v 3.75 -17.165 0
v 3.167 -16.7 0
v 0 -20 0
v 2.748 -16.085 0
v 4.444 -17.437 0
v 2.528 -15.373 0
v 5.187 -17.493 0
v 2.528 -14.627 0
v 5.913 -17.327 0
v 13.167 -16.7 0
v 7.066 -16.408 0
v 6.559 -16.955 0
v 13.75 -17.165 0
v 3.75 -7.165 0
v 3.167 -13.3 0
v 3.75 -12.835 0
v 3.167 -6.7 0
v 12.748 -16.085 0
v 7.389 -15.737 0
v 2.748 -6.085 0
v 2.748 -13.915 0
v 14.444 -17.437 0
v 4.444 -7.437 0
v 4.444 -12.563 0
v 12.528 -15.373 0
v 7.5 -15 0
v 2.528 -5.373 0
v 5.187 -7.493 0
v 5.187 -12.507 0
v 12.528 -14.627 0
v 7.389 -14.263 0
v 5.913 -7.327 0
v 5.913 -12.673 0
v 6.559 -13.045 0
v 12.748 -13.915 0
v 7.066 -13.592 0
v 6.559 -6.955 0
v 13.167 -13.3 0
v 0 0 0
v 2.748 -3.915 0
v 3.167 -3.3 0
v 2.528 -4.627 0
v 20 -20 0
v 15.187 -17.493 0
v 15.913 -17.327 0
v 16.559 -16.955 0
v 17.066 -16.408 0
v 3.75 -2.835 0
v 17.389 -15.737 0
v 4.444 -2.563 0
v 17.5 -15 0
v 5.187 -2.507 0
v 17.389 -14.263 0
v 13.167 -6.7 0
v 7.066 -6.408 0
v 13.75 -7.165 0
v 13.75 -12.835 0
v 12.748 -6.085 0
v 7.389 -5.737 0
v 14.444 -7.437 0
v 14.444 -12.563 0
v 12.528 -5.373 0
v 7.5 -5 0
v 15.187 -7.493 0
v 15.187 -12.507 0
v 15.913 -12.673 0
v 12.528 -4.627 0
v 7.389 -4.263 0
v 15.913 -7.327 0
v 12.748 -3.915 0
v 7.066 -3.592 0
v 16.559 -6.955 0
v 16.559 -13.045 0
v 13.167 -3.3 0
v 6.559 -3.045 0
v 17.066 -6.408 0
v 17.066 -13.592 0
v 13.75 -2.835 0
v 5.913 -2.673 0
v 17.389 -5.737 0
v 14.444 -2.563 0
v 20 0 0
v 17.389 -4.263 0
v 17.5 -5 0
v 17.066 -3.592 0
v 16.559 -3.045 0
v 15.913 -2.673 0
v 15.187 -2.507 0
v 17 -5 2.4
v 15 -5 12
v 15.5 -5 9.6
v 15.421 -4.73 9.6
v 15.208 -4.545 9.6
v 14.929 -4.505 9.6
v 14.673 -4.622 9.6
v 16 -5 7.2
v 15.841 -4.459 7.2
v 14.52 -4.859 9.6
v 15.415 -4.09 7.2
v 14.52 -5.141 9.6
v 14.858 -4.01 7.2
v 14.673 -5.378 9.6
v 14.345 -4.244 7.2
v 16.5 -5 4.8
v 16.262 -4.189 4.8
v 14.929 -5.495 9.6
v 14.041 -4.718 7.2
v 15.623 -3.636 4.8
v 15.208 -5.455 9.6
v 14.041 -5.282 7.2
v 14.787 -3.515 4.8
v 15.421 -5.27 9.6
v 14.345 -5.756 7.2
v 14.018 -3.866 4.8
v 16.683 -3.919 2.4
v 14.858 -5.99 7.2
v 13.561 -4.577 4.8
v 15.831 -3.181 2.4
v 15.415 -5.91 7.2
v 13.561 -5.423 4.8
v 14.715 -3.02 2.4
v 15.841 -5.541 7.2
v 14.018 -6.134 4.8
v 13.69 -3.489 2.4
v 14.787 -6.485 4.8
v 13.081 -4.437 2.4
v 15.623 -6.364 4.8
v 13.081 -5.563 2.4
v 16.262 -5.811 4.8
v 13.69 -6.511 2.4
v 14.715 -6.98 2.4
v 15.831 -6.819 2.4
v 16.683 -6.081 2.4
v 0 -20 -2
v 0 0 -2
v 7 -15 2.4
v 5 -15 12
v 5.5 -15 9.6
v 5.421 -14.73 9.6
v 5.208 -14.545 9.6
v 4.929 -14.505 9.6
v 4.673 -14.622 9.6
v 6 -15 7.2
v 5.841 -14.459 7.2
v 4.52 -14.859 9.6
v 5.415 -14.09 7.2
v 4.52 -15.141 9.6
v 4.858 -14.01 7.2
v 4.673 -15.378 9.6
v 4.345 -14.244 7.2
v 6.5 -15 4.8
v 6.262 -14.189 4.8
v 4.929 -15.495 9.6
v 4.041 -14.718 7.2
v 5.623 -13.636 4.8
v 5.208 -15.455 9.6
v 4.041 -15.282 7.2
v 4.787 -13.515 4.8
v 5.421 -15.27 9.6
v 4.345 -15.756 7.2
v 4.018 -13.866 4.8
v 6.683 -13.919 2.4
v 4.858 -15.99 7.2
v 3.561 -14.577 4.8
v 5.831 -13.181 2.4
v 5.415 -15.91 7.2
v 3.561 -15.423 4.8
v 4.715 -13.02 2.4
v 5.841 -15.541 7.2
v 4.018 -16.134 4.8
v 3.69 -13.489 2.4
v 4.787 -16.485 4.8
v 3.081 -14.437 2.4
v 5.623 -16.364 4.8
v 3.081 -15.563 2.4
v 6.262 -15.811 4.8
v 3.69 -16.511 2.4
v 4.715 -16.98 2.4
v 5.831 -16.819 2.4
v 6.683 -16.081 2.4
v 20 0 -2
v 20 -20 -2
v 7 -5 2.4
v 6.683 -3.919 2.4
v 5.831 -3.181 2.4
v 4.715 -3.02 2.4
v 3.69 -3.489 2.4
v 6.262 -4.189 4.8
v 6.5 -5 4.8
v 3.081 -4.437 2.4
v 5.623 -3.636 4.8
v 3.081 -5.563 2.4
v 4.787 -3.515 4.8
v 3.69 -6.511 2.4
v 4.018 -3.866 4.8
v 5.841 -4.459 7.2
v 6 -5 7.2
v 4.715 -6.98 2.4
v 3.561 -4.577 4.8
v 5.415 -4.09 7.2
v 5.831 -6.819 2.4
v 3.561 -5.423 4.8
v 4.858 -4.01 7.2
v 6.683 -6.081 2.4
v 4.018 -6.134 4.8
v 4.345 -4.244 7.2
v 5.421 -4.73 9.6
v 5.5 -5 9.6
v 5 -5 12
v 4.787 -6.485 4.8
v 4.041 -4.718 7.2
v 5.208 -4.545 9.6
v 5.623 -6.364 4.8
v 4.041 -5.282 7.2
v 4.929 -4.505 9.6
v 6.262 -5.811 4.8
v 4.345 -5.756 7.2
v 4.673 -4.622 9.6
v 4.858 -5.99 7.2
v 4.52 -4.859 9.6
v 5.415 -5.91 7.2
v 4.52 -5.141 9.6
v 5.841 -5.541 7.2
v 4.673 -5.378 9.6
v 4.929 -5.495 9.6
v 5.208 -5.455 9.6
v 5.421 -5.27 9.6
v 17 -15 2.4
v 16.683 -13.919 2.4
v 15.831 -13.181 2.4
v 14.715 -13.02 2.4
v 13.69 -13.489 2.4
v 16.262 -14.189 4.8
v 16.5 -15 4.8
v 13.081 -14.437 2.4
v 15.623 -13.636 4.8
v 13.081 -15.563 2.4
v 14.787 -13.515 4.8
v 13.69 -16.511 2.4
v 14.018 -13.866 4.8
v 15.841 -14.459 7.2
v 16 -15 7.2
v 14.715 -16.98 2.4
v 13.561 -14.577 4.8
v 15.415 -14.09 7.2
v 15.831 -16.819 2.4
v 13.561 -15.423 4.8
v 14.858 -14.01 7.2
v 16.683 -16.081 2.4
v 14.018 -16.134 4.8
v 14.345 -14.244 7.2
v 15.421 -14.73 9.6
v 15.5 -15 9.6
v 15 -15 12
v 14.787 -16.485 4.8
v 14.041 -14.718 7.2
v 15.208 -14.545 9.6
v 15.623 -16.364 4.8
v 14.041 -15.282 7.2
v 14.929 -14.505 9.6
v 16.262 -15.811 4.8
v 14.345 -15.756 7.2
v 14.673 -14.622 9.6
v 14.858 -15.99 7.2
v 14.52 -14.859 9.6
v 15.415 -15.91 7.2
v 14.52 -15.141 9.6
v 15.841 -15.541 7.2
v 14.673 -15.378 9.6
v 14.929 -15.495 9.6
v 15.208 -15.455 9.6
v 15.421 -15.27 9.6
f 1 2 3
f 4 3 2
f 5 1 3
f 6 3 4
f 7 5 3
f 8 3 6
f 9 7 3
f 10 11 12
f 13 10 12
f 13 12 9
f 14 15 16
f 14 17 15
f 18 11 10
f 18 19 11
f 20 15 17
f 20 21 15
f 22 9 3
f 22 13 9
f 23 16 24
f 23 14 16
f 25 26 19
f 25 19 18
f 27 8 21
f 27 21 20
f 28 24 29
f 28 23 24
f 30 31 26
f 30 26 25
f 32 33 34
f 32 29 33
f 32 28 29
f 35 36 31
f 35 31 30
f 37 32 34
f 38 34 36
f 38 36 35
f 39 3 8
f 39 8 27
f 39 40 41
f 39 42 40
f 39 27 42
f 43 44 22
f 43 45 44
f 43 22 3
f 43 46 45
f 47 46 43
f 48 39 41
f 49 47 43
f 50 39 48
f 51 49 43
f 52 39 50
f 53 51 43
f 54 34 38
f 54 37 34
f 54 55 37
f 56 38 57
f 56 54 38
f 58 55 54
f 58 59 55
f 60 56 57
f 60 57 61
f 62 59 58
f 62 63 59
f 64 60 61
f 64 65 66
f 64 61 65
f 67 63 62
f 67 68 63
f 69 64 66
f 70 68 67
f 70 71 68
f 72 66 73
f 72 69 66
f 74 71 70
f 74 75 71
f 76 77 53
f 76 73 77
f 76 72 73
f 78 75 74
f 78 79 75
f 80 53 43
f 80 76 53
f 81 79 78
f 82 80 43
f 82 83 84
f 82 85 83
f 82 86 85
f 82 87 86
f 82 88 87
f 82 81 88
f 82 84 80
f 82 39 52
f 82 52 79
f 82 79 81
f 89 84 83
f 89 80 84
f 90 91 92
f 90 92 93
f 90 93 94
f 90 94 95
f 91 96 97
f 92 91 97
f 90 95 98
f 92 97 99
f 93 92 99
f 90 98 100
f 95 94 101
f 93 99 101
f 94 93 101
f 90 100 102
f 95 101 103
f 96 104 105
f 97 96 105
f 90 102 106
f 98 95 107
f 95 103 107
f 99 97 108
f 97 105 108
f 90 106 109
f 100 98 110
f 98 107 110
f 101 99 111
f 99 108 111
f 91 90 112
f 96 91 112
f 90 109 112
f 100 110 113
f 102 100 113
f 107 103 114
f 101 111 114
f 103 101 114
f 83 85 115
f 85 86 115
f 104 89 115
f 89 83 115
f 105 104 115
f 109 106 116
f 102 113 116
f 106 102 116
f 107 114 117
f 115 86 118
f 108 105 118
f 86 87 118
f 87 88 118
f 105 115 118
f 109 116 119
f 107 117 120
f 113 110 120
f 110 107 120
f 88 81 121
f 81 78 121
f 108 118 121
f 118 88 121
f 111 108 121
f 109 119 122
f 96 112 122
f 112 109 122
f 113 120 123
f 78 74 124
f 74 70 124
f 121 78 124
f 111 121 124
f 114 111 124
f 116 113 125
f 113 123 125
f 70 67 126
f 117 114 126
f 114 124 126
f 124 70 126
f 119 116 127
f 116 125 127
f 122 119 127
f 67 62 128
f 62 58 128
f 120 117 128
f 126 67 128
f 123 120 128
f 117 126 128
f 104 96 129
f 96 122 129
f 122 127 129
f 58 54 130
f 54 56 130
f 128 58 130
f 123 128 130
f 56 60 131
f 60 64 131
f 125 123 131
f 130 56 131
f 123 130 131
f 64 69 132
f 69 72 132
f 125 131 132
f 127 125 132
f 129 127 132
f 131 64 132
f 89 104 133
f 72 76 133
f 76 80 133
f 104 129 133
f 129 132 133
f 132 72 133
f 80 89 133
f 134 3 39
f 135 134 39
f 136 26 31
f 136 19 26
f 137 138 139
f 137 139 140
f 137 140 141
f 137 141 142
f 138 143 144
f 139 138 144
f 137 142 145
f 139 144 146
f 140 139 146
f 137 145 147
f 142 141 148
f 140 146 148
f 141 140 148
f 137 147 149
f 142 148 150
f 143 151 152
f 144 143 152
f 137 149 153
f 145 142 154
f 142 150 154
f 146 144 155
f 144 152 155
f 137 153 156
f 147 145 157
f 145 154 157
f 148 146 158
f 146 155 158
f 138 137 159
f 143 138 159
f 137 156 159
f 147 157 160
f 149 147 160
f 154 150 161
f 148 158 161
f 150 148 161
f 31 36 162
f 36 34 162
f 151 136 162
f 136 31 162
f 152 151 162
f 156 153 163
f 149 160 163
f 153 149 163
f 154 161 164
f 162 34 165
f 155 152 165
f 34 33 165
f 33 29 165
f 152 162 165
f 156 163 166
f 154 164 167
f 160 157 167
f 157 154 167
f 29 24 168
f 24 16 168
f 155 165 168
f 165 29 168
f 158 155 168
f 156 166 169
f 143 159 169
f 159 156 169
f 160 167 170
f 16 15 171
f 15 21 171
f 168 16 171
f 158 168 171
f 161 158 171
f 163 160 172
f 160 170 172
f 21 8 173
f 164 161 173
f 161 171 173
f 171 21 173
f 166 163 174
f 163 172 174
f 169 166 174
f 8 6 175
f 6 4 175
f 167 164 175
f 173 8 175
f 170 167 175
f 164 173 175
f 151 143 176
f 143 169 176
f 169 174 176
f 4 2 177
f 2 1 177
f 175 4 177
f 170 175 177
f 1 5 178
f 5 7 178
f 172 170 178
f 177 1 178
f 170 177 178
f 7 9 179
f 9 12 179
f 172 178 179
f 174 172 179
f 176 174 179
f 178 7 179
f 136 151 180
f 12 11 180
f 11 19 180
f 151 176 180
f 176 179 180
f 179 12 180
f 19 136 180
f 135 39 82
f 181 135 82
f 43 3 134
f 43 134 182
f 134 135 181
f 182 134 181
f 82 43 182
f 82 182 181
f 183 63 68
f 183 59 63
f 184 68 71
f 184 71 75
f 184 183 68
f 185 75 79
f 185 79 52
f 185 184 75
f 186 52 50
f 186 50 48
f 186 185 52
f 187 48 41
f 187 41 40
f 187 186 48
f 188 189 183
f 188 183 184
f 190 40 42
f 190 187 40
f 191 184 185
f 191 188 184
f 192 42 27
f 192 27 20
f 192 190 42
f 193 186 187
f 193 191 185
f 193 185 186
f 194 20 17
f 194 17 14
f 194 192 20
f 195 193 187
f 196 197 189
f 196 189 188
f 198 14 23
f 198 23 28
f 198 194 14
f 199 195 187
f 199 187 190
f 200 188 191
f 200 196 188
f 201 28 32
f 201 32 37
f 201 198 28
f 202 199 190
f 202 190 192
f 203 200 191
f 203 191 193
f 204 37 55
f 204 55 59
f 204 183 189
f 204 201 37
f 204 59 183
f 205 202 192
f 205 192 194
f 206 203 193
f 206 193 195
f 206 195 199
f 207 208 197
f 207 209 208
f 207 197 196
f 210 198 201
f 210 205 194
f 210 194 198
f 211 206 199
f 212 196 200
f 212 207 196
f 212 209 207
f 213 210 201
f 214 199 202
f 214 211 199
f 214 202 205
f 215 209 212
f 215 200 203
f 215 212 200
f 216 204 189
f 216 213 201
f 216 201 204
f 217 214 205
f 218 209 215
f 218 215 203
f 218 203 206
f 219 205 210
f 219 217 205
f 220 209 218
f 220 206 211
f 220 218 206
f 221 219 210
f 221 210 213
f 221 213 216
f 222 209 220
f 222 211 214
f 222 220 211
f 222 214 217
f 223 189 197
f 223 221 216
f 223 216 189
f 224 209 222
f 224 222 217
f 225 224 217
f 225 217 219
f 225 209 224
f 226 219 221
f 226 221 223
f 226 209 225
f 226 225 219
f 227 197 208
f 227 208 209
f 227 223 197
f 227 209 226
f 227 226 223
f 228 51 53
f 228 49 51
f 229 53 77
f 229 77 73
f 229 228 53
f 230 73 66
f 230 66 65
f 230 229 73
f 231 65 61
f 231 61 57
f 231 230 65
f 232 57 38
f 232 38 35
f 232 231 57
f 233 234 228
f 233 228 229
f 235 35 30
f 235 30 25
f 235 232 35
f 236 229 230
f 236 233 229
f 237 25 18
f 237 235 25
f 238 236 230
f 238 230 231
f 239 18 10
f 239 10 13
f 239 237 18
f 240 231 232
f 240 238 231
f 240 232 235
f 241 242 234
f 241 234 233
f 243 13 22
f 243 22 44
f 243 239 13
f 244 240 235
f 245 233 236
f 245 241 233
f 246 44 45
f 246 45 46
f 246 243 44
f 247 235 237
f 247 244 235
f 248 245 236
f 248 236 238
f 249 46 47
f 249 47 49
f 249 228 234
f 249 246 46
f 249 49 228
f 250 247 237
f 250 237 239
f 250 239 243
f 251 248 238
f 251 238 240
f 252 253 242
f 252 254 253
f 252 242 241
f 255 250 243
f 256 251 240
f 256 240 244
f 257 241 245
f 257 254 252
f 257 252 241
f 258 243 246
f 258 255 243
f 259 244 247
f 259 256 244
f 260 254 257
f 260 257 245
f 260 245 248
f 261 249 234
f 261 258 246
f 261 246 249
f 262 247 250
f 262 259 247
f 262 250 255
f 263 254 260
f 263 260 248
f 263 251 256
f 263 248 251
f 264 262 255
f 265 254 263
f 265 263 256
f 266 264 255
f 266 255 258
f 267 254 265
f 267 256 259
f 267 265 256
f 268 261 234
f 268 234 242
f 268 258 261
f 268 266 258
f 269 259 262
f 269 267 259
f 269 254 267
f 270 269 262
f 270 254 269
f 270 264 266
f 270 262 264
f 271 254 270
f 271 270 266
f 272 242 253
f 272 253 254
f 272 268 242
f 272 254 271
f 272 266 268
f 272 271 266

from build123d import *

# Parameters (mm, degrees)
F0_W     = 20
F0_H     = 20
F0_R     = 2.5
F1_DEPTH = 2


with BuildPart() as f1:
    # F0 (on Top) → F1 (new body)
    with BuildSketch(Plane.XY):
        with Locations((10, -10)):
            Rectangle(F0_W, F0_H)
        with Locations((5, -15)):
            Circle(F0_R, mode=Mode.SUBTRACT)
        with Locations((15, -15)):
            Circle(F0_R, mode=Mode.SUBTRACT)
        with Locations((5, -5)):
            Circle(F0_R, mode=Mode.SUBTRACT)
        with Locations((15, -5)):
            Circle(F0_R, mode=Mode.SUBTRACT)
        with Locations((5, -5)):
            Circle(F0_R)
        with Locations((15, -5)):
            Circle(F0_R)
        with Locations((15, -15)):
            Circle(F0_R)
        with Locations((5, -15)):
            Circle(F0_R)
    extrude(amount=-F1_DEPTH)

    # F0 (on Top) → F4 section 0
    with BuildSketch(Plane.XY, mode=Mode.PRIVATE) as f4_s0:
        with Locations((15, -15)):
            Circle(F0_R)
    loft([f4_s0.sketch, Vertex(15, -15, 12)])

    # F0 (on Top) → F5 section 0
    with BuildSketch(Plane.XY, mode=Mode.PRIVATE) as f5_s0:
        with Locations((15, -5)):
            Circle(F0_R)
    loft([Vertex(15, -5, 12), f5_s0.sketch])

    # F0 (on Top) → F6 section 0
    with BuildSketch(Plane.XY, mode=Mode.PRIVATE) as f6_s0:
        with Locations((5, -5)):
            Circle(F0_R)
    loft([f6_s0.sketch, Vertex(5, -5, 12)])

    # F0 (on Top) → F7 section 0
    with BuildSketch(Plane.XY, mode=Mode.PRIVATE) as f7_s0:
        with Locations((5, -15)):
            Circle(F0_R)
    loft([Vertex(5, -15, 12), f7_s0.sketch])


solid = f1.part
